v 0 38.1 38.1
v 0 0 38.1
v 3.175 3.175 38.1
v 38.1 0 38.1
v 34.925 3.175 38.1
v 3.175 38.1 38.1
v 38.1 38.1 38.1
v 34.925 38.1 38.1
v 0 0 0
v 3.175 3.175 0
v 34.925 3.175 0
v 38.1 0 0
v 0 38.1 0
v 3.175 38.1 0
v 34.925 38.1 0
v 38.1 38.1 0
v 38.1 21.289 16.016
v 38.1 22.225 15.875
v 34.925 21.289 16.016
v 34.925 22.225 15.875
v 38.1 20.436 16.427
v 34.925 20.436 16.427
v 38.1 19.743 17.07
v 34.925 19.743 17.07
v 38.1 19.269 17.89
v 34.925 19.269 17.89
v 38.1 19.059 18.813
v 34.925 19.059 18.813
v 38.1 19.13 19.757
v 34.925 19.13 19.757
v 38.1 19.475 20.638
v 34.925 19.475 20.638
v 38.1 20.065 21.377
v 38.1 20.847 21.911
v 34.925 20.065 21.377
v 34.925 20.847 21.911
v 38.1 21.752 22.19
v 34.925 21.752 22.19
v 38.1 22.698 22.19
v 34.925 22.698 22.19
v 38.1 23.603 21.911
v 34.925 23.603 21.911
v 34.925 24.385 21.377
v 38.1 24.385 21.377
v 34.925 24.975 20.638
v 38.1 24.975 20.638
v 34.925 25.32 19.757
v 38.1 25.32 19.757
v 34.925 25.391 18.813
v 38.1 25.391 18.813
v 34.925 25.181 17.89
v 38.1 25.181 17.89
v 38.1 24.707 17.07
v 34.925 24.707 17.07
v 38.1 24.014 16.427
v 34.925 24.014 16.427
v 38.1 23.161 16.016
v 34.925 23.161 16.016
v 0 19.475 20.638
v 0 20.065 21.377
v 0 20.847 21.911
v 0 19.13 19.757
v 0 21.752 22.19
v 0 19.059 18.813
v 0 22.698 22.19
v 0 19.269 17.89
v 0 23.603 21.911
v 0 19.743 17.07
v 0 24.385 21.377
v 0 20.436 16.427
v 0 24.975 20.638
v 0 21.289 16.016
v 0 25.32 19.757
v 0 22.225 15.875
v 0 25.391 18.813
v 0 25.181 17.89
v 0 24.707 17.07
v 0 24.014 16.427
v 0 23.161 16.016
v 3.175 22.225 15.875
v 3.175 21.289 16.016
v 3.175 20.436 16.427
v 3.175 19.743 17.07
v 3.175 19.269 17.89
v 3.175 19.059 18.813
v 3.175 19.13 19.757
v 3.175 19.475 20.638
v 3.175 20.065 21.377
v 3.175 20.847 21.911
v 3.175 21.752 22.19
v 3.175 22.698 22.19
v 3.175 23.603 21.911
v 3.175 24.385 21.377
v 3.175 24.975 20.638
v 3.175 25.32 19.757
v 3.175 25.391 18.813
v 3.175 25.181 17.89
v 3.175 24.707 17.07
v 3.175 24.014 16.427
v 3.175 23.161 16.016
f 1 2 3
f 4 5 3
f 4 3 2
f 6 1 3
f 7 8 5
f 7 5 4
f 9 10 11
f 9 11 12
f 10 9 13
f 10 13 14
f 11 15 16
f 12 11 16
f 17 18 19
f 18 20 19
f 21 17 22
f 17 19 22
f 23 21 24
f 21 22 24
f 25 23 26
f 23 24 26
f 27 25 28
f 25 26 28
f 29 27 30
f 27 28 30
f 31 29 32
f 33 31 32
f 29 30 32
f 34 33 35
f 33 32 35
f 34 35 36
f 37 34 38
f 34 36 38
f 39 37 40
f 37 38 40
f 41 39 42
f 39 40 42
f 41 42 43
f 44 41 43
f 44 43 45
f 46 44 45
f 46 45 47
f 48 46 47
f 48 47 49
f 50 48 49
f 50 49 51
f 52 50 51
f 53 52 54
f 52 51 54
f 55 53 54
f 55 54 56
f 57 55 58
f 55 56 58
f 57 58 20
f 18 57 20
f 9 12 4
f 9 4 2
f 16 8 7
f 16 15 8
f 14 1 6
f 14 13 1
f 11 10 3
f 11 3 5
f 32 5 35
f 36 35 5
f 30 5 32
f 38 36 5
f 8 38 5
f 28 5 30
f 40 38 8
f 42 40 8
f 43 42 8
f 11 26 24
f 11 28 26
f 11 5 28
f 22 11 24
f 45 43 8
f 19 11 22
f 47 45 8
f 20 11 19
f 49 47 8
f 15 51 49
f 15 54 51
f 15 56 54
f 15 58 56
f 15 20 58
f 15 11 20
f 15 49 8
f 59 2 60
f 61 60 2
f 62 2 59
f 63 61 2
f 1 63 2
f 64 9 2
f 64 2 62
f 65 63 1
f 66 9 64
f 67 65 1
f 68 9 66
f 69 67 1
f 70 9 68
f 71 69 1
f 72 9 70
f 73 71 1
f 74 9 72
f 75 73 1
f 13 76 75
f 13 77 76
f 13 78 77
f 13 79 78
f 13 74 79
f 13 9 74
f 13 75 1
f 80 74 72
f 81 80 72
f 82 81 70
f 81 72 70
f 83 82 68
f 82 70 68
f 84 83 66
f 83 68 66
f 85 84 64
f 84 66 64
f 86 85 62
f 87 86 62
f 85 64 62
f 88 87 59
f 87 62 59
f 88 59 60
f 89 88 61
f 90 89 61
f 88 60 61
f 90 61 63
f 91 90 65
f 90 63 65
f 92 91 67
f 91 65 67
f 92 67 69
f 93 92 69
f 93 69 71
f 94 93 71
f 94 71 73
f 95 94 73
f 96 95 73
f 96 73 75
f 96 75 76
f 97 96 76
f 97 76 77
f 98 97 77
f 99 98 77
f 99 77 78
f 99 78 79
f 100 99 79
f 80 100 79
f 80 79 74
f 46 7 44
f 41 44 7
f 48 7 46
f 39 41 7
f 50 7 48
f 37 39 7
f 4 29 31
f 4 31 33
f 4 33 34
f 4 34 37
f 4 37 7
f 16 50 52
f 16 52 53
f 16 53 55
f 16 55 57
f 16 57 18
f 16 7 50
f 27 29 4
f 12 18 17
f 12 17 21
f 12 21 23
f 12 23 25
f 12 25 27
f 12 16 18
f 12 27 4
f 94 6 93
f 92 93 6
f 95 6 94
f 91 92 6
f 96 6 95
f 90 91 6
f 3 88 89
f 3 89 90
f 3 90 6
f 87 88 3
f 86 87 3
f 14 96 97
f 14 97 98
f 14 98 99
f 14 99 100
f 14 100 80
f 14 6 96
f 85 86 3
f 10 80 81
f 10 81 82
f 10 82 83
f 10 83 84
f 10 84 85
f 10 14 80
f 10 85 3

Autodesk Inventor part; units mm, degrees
ref_plane "YZ Plane" through (0, 0, 0) normal (1, 0, 0) x (0, 1, 0)
ref_plane "XZ Plane" through (0, 0, 0) normal (0, 1, 0) x (-1, 0, 0)
ref_plane "XY Plane" through (0, 0, 0) normal (0, 0, 1) x (1, 0, 0)
sketch "Sketch1" plane through (0, 0, 0) normal (0, 0, 1) x (1, 0, 0)
  line L0 (0, 0) -> (0, 38.1)
  line L1 (0, 38.1) -> (3.175, 38.1)
  line L2 (3.175, 38.1) -> (3.175, 3.175)
  line L3 (3.175, 3.175) -> (34.925, 3.175)
  line L4 (34.925, 3.175) -> (34.925, 38.1)
  line L5 (34.925, 38.1) -> (38.1, 38.1)
  line L6 (38.1, 38.1) -> (38.1, 0)
  line L7 (38.1, 0) -> (0, 0)
  dimension "d0" = 38.1
  dimension "d2" = 3.175
  dimension "d3" = 3.175
  dimension "d4" = 38.1
  dimension "d5" = 3.175
extrude "Extrusion1" add sketch "Sketch1" along normal blind 38.1
sketch "Sketch2" plane through (38.1, 0, 0) normal (1, 0, 0) x (0, 0, -1)
  line L0 (0, 38.1) -> (0, 0) projected
  line L1 (0, 38.1) -> (-38.1, 38.1) projected
  line L2 (-38.1, 0) -> (-38.1, 38.1) projected
  line L3 (0, 0) -> (-38.1, 0) projected
  line L4 (0, 3.175) -> (-38.1, 3.175) projected
  point P0 (0, 0)
  point P1 (-19.05, 22.225)
  dimension "d8" = 19.05
  dimension "d9" = 19.05
  dimension "d19" = 19.05
hole "Hole1" at (38.1, 22.225, 19.05) direction (-1, 0, 0) diameter 6.35 end through all
equation "\"d3\" = d2"
equation "\"d5\" = d2"
equation "\"d8\" = d9"
properties part number "CLB_062_ScissorLiftUBracket"
